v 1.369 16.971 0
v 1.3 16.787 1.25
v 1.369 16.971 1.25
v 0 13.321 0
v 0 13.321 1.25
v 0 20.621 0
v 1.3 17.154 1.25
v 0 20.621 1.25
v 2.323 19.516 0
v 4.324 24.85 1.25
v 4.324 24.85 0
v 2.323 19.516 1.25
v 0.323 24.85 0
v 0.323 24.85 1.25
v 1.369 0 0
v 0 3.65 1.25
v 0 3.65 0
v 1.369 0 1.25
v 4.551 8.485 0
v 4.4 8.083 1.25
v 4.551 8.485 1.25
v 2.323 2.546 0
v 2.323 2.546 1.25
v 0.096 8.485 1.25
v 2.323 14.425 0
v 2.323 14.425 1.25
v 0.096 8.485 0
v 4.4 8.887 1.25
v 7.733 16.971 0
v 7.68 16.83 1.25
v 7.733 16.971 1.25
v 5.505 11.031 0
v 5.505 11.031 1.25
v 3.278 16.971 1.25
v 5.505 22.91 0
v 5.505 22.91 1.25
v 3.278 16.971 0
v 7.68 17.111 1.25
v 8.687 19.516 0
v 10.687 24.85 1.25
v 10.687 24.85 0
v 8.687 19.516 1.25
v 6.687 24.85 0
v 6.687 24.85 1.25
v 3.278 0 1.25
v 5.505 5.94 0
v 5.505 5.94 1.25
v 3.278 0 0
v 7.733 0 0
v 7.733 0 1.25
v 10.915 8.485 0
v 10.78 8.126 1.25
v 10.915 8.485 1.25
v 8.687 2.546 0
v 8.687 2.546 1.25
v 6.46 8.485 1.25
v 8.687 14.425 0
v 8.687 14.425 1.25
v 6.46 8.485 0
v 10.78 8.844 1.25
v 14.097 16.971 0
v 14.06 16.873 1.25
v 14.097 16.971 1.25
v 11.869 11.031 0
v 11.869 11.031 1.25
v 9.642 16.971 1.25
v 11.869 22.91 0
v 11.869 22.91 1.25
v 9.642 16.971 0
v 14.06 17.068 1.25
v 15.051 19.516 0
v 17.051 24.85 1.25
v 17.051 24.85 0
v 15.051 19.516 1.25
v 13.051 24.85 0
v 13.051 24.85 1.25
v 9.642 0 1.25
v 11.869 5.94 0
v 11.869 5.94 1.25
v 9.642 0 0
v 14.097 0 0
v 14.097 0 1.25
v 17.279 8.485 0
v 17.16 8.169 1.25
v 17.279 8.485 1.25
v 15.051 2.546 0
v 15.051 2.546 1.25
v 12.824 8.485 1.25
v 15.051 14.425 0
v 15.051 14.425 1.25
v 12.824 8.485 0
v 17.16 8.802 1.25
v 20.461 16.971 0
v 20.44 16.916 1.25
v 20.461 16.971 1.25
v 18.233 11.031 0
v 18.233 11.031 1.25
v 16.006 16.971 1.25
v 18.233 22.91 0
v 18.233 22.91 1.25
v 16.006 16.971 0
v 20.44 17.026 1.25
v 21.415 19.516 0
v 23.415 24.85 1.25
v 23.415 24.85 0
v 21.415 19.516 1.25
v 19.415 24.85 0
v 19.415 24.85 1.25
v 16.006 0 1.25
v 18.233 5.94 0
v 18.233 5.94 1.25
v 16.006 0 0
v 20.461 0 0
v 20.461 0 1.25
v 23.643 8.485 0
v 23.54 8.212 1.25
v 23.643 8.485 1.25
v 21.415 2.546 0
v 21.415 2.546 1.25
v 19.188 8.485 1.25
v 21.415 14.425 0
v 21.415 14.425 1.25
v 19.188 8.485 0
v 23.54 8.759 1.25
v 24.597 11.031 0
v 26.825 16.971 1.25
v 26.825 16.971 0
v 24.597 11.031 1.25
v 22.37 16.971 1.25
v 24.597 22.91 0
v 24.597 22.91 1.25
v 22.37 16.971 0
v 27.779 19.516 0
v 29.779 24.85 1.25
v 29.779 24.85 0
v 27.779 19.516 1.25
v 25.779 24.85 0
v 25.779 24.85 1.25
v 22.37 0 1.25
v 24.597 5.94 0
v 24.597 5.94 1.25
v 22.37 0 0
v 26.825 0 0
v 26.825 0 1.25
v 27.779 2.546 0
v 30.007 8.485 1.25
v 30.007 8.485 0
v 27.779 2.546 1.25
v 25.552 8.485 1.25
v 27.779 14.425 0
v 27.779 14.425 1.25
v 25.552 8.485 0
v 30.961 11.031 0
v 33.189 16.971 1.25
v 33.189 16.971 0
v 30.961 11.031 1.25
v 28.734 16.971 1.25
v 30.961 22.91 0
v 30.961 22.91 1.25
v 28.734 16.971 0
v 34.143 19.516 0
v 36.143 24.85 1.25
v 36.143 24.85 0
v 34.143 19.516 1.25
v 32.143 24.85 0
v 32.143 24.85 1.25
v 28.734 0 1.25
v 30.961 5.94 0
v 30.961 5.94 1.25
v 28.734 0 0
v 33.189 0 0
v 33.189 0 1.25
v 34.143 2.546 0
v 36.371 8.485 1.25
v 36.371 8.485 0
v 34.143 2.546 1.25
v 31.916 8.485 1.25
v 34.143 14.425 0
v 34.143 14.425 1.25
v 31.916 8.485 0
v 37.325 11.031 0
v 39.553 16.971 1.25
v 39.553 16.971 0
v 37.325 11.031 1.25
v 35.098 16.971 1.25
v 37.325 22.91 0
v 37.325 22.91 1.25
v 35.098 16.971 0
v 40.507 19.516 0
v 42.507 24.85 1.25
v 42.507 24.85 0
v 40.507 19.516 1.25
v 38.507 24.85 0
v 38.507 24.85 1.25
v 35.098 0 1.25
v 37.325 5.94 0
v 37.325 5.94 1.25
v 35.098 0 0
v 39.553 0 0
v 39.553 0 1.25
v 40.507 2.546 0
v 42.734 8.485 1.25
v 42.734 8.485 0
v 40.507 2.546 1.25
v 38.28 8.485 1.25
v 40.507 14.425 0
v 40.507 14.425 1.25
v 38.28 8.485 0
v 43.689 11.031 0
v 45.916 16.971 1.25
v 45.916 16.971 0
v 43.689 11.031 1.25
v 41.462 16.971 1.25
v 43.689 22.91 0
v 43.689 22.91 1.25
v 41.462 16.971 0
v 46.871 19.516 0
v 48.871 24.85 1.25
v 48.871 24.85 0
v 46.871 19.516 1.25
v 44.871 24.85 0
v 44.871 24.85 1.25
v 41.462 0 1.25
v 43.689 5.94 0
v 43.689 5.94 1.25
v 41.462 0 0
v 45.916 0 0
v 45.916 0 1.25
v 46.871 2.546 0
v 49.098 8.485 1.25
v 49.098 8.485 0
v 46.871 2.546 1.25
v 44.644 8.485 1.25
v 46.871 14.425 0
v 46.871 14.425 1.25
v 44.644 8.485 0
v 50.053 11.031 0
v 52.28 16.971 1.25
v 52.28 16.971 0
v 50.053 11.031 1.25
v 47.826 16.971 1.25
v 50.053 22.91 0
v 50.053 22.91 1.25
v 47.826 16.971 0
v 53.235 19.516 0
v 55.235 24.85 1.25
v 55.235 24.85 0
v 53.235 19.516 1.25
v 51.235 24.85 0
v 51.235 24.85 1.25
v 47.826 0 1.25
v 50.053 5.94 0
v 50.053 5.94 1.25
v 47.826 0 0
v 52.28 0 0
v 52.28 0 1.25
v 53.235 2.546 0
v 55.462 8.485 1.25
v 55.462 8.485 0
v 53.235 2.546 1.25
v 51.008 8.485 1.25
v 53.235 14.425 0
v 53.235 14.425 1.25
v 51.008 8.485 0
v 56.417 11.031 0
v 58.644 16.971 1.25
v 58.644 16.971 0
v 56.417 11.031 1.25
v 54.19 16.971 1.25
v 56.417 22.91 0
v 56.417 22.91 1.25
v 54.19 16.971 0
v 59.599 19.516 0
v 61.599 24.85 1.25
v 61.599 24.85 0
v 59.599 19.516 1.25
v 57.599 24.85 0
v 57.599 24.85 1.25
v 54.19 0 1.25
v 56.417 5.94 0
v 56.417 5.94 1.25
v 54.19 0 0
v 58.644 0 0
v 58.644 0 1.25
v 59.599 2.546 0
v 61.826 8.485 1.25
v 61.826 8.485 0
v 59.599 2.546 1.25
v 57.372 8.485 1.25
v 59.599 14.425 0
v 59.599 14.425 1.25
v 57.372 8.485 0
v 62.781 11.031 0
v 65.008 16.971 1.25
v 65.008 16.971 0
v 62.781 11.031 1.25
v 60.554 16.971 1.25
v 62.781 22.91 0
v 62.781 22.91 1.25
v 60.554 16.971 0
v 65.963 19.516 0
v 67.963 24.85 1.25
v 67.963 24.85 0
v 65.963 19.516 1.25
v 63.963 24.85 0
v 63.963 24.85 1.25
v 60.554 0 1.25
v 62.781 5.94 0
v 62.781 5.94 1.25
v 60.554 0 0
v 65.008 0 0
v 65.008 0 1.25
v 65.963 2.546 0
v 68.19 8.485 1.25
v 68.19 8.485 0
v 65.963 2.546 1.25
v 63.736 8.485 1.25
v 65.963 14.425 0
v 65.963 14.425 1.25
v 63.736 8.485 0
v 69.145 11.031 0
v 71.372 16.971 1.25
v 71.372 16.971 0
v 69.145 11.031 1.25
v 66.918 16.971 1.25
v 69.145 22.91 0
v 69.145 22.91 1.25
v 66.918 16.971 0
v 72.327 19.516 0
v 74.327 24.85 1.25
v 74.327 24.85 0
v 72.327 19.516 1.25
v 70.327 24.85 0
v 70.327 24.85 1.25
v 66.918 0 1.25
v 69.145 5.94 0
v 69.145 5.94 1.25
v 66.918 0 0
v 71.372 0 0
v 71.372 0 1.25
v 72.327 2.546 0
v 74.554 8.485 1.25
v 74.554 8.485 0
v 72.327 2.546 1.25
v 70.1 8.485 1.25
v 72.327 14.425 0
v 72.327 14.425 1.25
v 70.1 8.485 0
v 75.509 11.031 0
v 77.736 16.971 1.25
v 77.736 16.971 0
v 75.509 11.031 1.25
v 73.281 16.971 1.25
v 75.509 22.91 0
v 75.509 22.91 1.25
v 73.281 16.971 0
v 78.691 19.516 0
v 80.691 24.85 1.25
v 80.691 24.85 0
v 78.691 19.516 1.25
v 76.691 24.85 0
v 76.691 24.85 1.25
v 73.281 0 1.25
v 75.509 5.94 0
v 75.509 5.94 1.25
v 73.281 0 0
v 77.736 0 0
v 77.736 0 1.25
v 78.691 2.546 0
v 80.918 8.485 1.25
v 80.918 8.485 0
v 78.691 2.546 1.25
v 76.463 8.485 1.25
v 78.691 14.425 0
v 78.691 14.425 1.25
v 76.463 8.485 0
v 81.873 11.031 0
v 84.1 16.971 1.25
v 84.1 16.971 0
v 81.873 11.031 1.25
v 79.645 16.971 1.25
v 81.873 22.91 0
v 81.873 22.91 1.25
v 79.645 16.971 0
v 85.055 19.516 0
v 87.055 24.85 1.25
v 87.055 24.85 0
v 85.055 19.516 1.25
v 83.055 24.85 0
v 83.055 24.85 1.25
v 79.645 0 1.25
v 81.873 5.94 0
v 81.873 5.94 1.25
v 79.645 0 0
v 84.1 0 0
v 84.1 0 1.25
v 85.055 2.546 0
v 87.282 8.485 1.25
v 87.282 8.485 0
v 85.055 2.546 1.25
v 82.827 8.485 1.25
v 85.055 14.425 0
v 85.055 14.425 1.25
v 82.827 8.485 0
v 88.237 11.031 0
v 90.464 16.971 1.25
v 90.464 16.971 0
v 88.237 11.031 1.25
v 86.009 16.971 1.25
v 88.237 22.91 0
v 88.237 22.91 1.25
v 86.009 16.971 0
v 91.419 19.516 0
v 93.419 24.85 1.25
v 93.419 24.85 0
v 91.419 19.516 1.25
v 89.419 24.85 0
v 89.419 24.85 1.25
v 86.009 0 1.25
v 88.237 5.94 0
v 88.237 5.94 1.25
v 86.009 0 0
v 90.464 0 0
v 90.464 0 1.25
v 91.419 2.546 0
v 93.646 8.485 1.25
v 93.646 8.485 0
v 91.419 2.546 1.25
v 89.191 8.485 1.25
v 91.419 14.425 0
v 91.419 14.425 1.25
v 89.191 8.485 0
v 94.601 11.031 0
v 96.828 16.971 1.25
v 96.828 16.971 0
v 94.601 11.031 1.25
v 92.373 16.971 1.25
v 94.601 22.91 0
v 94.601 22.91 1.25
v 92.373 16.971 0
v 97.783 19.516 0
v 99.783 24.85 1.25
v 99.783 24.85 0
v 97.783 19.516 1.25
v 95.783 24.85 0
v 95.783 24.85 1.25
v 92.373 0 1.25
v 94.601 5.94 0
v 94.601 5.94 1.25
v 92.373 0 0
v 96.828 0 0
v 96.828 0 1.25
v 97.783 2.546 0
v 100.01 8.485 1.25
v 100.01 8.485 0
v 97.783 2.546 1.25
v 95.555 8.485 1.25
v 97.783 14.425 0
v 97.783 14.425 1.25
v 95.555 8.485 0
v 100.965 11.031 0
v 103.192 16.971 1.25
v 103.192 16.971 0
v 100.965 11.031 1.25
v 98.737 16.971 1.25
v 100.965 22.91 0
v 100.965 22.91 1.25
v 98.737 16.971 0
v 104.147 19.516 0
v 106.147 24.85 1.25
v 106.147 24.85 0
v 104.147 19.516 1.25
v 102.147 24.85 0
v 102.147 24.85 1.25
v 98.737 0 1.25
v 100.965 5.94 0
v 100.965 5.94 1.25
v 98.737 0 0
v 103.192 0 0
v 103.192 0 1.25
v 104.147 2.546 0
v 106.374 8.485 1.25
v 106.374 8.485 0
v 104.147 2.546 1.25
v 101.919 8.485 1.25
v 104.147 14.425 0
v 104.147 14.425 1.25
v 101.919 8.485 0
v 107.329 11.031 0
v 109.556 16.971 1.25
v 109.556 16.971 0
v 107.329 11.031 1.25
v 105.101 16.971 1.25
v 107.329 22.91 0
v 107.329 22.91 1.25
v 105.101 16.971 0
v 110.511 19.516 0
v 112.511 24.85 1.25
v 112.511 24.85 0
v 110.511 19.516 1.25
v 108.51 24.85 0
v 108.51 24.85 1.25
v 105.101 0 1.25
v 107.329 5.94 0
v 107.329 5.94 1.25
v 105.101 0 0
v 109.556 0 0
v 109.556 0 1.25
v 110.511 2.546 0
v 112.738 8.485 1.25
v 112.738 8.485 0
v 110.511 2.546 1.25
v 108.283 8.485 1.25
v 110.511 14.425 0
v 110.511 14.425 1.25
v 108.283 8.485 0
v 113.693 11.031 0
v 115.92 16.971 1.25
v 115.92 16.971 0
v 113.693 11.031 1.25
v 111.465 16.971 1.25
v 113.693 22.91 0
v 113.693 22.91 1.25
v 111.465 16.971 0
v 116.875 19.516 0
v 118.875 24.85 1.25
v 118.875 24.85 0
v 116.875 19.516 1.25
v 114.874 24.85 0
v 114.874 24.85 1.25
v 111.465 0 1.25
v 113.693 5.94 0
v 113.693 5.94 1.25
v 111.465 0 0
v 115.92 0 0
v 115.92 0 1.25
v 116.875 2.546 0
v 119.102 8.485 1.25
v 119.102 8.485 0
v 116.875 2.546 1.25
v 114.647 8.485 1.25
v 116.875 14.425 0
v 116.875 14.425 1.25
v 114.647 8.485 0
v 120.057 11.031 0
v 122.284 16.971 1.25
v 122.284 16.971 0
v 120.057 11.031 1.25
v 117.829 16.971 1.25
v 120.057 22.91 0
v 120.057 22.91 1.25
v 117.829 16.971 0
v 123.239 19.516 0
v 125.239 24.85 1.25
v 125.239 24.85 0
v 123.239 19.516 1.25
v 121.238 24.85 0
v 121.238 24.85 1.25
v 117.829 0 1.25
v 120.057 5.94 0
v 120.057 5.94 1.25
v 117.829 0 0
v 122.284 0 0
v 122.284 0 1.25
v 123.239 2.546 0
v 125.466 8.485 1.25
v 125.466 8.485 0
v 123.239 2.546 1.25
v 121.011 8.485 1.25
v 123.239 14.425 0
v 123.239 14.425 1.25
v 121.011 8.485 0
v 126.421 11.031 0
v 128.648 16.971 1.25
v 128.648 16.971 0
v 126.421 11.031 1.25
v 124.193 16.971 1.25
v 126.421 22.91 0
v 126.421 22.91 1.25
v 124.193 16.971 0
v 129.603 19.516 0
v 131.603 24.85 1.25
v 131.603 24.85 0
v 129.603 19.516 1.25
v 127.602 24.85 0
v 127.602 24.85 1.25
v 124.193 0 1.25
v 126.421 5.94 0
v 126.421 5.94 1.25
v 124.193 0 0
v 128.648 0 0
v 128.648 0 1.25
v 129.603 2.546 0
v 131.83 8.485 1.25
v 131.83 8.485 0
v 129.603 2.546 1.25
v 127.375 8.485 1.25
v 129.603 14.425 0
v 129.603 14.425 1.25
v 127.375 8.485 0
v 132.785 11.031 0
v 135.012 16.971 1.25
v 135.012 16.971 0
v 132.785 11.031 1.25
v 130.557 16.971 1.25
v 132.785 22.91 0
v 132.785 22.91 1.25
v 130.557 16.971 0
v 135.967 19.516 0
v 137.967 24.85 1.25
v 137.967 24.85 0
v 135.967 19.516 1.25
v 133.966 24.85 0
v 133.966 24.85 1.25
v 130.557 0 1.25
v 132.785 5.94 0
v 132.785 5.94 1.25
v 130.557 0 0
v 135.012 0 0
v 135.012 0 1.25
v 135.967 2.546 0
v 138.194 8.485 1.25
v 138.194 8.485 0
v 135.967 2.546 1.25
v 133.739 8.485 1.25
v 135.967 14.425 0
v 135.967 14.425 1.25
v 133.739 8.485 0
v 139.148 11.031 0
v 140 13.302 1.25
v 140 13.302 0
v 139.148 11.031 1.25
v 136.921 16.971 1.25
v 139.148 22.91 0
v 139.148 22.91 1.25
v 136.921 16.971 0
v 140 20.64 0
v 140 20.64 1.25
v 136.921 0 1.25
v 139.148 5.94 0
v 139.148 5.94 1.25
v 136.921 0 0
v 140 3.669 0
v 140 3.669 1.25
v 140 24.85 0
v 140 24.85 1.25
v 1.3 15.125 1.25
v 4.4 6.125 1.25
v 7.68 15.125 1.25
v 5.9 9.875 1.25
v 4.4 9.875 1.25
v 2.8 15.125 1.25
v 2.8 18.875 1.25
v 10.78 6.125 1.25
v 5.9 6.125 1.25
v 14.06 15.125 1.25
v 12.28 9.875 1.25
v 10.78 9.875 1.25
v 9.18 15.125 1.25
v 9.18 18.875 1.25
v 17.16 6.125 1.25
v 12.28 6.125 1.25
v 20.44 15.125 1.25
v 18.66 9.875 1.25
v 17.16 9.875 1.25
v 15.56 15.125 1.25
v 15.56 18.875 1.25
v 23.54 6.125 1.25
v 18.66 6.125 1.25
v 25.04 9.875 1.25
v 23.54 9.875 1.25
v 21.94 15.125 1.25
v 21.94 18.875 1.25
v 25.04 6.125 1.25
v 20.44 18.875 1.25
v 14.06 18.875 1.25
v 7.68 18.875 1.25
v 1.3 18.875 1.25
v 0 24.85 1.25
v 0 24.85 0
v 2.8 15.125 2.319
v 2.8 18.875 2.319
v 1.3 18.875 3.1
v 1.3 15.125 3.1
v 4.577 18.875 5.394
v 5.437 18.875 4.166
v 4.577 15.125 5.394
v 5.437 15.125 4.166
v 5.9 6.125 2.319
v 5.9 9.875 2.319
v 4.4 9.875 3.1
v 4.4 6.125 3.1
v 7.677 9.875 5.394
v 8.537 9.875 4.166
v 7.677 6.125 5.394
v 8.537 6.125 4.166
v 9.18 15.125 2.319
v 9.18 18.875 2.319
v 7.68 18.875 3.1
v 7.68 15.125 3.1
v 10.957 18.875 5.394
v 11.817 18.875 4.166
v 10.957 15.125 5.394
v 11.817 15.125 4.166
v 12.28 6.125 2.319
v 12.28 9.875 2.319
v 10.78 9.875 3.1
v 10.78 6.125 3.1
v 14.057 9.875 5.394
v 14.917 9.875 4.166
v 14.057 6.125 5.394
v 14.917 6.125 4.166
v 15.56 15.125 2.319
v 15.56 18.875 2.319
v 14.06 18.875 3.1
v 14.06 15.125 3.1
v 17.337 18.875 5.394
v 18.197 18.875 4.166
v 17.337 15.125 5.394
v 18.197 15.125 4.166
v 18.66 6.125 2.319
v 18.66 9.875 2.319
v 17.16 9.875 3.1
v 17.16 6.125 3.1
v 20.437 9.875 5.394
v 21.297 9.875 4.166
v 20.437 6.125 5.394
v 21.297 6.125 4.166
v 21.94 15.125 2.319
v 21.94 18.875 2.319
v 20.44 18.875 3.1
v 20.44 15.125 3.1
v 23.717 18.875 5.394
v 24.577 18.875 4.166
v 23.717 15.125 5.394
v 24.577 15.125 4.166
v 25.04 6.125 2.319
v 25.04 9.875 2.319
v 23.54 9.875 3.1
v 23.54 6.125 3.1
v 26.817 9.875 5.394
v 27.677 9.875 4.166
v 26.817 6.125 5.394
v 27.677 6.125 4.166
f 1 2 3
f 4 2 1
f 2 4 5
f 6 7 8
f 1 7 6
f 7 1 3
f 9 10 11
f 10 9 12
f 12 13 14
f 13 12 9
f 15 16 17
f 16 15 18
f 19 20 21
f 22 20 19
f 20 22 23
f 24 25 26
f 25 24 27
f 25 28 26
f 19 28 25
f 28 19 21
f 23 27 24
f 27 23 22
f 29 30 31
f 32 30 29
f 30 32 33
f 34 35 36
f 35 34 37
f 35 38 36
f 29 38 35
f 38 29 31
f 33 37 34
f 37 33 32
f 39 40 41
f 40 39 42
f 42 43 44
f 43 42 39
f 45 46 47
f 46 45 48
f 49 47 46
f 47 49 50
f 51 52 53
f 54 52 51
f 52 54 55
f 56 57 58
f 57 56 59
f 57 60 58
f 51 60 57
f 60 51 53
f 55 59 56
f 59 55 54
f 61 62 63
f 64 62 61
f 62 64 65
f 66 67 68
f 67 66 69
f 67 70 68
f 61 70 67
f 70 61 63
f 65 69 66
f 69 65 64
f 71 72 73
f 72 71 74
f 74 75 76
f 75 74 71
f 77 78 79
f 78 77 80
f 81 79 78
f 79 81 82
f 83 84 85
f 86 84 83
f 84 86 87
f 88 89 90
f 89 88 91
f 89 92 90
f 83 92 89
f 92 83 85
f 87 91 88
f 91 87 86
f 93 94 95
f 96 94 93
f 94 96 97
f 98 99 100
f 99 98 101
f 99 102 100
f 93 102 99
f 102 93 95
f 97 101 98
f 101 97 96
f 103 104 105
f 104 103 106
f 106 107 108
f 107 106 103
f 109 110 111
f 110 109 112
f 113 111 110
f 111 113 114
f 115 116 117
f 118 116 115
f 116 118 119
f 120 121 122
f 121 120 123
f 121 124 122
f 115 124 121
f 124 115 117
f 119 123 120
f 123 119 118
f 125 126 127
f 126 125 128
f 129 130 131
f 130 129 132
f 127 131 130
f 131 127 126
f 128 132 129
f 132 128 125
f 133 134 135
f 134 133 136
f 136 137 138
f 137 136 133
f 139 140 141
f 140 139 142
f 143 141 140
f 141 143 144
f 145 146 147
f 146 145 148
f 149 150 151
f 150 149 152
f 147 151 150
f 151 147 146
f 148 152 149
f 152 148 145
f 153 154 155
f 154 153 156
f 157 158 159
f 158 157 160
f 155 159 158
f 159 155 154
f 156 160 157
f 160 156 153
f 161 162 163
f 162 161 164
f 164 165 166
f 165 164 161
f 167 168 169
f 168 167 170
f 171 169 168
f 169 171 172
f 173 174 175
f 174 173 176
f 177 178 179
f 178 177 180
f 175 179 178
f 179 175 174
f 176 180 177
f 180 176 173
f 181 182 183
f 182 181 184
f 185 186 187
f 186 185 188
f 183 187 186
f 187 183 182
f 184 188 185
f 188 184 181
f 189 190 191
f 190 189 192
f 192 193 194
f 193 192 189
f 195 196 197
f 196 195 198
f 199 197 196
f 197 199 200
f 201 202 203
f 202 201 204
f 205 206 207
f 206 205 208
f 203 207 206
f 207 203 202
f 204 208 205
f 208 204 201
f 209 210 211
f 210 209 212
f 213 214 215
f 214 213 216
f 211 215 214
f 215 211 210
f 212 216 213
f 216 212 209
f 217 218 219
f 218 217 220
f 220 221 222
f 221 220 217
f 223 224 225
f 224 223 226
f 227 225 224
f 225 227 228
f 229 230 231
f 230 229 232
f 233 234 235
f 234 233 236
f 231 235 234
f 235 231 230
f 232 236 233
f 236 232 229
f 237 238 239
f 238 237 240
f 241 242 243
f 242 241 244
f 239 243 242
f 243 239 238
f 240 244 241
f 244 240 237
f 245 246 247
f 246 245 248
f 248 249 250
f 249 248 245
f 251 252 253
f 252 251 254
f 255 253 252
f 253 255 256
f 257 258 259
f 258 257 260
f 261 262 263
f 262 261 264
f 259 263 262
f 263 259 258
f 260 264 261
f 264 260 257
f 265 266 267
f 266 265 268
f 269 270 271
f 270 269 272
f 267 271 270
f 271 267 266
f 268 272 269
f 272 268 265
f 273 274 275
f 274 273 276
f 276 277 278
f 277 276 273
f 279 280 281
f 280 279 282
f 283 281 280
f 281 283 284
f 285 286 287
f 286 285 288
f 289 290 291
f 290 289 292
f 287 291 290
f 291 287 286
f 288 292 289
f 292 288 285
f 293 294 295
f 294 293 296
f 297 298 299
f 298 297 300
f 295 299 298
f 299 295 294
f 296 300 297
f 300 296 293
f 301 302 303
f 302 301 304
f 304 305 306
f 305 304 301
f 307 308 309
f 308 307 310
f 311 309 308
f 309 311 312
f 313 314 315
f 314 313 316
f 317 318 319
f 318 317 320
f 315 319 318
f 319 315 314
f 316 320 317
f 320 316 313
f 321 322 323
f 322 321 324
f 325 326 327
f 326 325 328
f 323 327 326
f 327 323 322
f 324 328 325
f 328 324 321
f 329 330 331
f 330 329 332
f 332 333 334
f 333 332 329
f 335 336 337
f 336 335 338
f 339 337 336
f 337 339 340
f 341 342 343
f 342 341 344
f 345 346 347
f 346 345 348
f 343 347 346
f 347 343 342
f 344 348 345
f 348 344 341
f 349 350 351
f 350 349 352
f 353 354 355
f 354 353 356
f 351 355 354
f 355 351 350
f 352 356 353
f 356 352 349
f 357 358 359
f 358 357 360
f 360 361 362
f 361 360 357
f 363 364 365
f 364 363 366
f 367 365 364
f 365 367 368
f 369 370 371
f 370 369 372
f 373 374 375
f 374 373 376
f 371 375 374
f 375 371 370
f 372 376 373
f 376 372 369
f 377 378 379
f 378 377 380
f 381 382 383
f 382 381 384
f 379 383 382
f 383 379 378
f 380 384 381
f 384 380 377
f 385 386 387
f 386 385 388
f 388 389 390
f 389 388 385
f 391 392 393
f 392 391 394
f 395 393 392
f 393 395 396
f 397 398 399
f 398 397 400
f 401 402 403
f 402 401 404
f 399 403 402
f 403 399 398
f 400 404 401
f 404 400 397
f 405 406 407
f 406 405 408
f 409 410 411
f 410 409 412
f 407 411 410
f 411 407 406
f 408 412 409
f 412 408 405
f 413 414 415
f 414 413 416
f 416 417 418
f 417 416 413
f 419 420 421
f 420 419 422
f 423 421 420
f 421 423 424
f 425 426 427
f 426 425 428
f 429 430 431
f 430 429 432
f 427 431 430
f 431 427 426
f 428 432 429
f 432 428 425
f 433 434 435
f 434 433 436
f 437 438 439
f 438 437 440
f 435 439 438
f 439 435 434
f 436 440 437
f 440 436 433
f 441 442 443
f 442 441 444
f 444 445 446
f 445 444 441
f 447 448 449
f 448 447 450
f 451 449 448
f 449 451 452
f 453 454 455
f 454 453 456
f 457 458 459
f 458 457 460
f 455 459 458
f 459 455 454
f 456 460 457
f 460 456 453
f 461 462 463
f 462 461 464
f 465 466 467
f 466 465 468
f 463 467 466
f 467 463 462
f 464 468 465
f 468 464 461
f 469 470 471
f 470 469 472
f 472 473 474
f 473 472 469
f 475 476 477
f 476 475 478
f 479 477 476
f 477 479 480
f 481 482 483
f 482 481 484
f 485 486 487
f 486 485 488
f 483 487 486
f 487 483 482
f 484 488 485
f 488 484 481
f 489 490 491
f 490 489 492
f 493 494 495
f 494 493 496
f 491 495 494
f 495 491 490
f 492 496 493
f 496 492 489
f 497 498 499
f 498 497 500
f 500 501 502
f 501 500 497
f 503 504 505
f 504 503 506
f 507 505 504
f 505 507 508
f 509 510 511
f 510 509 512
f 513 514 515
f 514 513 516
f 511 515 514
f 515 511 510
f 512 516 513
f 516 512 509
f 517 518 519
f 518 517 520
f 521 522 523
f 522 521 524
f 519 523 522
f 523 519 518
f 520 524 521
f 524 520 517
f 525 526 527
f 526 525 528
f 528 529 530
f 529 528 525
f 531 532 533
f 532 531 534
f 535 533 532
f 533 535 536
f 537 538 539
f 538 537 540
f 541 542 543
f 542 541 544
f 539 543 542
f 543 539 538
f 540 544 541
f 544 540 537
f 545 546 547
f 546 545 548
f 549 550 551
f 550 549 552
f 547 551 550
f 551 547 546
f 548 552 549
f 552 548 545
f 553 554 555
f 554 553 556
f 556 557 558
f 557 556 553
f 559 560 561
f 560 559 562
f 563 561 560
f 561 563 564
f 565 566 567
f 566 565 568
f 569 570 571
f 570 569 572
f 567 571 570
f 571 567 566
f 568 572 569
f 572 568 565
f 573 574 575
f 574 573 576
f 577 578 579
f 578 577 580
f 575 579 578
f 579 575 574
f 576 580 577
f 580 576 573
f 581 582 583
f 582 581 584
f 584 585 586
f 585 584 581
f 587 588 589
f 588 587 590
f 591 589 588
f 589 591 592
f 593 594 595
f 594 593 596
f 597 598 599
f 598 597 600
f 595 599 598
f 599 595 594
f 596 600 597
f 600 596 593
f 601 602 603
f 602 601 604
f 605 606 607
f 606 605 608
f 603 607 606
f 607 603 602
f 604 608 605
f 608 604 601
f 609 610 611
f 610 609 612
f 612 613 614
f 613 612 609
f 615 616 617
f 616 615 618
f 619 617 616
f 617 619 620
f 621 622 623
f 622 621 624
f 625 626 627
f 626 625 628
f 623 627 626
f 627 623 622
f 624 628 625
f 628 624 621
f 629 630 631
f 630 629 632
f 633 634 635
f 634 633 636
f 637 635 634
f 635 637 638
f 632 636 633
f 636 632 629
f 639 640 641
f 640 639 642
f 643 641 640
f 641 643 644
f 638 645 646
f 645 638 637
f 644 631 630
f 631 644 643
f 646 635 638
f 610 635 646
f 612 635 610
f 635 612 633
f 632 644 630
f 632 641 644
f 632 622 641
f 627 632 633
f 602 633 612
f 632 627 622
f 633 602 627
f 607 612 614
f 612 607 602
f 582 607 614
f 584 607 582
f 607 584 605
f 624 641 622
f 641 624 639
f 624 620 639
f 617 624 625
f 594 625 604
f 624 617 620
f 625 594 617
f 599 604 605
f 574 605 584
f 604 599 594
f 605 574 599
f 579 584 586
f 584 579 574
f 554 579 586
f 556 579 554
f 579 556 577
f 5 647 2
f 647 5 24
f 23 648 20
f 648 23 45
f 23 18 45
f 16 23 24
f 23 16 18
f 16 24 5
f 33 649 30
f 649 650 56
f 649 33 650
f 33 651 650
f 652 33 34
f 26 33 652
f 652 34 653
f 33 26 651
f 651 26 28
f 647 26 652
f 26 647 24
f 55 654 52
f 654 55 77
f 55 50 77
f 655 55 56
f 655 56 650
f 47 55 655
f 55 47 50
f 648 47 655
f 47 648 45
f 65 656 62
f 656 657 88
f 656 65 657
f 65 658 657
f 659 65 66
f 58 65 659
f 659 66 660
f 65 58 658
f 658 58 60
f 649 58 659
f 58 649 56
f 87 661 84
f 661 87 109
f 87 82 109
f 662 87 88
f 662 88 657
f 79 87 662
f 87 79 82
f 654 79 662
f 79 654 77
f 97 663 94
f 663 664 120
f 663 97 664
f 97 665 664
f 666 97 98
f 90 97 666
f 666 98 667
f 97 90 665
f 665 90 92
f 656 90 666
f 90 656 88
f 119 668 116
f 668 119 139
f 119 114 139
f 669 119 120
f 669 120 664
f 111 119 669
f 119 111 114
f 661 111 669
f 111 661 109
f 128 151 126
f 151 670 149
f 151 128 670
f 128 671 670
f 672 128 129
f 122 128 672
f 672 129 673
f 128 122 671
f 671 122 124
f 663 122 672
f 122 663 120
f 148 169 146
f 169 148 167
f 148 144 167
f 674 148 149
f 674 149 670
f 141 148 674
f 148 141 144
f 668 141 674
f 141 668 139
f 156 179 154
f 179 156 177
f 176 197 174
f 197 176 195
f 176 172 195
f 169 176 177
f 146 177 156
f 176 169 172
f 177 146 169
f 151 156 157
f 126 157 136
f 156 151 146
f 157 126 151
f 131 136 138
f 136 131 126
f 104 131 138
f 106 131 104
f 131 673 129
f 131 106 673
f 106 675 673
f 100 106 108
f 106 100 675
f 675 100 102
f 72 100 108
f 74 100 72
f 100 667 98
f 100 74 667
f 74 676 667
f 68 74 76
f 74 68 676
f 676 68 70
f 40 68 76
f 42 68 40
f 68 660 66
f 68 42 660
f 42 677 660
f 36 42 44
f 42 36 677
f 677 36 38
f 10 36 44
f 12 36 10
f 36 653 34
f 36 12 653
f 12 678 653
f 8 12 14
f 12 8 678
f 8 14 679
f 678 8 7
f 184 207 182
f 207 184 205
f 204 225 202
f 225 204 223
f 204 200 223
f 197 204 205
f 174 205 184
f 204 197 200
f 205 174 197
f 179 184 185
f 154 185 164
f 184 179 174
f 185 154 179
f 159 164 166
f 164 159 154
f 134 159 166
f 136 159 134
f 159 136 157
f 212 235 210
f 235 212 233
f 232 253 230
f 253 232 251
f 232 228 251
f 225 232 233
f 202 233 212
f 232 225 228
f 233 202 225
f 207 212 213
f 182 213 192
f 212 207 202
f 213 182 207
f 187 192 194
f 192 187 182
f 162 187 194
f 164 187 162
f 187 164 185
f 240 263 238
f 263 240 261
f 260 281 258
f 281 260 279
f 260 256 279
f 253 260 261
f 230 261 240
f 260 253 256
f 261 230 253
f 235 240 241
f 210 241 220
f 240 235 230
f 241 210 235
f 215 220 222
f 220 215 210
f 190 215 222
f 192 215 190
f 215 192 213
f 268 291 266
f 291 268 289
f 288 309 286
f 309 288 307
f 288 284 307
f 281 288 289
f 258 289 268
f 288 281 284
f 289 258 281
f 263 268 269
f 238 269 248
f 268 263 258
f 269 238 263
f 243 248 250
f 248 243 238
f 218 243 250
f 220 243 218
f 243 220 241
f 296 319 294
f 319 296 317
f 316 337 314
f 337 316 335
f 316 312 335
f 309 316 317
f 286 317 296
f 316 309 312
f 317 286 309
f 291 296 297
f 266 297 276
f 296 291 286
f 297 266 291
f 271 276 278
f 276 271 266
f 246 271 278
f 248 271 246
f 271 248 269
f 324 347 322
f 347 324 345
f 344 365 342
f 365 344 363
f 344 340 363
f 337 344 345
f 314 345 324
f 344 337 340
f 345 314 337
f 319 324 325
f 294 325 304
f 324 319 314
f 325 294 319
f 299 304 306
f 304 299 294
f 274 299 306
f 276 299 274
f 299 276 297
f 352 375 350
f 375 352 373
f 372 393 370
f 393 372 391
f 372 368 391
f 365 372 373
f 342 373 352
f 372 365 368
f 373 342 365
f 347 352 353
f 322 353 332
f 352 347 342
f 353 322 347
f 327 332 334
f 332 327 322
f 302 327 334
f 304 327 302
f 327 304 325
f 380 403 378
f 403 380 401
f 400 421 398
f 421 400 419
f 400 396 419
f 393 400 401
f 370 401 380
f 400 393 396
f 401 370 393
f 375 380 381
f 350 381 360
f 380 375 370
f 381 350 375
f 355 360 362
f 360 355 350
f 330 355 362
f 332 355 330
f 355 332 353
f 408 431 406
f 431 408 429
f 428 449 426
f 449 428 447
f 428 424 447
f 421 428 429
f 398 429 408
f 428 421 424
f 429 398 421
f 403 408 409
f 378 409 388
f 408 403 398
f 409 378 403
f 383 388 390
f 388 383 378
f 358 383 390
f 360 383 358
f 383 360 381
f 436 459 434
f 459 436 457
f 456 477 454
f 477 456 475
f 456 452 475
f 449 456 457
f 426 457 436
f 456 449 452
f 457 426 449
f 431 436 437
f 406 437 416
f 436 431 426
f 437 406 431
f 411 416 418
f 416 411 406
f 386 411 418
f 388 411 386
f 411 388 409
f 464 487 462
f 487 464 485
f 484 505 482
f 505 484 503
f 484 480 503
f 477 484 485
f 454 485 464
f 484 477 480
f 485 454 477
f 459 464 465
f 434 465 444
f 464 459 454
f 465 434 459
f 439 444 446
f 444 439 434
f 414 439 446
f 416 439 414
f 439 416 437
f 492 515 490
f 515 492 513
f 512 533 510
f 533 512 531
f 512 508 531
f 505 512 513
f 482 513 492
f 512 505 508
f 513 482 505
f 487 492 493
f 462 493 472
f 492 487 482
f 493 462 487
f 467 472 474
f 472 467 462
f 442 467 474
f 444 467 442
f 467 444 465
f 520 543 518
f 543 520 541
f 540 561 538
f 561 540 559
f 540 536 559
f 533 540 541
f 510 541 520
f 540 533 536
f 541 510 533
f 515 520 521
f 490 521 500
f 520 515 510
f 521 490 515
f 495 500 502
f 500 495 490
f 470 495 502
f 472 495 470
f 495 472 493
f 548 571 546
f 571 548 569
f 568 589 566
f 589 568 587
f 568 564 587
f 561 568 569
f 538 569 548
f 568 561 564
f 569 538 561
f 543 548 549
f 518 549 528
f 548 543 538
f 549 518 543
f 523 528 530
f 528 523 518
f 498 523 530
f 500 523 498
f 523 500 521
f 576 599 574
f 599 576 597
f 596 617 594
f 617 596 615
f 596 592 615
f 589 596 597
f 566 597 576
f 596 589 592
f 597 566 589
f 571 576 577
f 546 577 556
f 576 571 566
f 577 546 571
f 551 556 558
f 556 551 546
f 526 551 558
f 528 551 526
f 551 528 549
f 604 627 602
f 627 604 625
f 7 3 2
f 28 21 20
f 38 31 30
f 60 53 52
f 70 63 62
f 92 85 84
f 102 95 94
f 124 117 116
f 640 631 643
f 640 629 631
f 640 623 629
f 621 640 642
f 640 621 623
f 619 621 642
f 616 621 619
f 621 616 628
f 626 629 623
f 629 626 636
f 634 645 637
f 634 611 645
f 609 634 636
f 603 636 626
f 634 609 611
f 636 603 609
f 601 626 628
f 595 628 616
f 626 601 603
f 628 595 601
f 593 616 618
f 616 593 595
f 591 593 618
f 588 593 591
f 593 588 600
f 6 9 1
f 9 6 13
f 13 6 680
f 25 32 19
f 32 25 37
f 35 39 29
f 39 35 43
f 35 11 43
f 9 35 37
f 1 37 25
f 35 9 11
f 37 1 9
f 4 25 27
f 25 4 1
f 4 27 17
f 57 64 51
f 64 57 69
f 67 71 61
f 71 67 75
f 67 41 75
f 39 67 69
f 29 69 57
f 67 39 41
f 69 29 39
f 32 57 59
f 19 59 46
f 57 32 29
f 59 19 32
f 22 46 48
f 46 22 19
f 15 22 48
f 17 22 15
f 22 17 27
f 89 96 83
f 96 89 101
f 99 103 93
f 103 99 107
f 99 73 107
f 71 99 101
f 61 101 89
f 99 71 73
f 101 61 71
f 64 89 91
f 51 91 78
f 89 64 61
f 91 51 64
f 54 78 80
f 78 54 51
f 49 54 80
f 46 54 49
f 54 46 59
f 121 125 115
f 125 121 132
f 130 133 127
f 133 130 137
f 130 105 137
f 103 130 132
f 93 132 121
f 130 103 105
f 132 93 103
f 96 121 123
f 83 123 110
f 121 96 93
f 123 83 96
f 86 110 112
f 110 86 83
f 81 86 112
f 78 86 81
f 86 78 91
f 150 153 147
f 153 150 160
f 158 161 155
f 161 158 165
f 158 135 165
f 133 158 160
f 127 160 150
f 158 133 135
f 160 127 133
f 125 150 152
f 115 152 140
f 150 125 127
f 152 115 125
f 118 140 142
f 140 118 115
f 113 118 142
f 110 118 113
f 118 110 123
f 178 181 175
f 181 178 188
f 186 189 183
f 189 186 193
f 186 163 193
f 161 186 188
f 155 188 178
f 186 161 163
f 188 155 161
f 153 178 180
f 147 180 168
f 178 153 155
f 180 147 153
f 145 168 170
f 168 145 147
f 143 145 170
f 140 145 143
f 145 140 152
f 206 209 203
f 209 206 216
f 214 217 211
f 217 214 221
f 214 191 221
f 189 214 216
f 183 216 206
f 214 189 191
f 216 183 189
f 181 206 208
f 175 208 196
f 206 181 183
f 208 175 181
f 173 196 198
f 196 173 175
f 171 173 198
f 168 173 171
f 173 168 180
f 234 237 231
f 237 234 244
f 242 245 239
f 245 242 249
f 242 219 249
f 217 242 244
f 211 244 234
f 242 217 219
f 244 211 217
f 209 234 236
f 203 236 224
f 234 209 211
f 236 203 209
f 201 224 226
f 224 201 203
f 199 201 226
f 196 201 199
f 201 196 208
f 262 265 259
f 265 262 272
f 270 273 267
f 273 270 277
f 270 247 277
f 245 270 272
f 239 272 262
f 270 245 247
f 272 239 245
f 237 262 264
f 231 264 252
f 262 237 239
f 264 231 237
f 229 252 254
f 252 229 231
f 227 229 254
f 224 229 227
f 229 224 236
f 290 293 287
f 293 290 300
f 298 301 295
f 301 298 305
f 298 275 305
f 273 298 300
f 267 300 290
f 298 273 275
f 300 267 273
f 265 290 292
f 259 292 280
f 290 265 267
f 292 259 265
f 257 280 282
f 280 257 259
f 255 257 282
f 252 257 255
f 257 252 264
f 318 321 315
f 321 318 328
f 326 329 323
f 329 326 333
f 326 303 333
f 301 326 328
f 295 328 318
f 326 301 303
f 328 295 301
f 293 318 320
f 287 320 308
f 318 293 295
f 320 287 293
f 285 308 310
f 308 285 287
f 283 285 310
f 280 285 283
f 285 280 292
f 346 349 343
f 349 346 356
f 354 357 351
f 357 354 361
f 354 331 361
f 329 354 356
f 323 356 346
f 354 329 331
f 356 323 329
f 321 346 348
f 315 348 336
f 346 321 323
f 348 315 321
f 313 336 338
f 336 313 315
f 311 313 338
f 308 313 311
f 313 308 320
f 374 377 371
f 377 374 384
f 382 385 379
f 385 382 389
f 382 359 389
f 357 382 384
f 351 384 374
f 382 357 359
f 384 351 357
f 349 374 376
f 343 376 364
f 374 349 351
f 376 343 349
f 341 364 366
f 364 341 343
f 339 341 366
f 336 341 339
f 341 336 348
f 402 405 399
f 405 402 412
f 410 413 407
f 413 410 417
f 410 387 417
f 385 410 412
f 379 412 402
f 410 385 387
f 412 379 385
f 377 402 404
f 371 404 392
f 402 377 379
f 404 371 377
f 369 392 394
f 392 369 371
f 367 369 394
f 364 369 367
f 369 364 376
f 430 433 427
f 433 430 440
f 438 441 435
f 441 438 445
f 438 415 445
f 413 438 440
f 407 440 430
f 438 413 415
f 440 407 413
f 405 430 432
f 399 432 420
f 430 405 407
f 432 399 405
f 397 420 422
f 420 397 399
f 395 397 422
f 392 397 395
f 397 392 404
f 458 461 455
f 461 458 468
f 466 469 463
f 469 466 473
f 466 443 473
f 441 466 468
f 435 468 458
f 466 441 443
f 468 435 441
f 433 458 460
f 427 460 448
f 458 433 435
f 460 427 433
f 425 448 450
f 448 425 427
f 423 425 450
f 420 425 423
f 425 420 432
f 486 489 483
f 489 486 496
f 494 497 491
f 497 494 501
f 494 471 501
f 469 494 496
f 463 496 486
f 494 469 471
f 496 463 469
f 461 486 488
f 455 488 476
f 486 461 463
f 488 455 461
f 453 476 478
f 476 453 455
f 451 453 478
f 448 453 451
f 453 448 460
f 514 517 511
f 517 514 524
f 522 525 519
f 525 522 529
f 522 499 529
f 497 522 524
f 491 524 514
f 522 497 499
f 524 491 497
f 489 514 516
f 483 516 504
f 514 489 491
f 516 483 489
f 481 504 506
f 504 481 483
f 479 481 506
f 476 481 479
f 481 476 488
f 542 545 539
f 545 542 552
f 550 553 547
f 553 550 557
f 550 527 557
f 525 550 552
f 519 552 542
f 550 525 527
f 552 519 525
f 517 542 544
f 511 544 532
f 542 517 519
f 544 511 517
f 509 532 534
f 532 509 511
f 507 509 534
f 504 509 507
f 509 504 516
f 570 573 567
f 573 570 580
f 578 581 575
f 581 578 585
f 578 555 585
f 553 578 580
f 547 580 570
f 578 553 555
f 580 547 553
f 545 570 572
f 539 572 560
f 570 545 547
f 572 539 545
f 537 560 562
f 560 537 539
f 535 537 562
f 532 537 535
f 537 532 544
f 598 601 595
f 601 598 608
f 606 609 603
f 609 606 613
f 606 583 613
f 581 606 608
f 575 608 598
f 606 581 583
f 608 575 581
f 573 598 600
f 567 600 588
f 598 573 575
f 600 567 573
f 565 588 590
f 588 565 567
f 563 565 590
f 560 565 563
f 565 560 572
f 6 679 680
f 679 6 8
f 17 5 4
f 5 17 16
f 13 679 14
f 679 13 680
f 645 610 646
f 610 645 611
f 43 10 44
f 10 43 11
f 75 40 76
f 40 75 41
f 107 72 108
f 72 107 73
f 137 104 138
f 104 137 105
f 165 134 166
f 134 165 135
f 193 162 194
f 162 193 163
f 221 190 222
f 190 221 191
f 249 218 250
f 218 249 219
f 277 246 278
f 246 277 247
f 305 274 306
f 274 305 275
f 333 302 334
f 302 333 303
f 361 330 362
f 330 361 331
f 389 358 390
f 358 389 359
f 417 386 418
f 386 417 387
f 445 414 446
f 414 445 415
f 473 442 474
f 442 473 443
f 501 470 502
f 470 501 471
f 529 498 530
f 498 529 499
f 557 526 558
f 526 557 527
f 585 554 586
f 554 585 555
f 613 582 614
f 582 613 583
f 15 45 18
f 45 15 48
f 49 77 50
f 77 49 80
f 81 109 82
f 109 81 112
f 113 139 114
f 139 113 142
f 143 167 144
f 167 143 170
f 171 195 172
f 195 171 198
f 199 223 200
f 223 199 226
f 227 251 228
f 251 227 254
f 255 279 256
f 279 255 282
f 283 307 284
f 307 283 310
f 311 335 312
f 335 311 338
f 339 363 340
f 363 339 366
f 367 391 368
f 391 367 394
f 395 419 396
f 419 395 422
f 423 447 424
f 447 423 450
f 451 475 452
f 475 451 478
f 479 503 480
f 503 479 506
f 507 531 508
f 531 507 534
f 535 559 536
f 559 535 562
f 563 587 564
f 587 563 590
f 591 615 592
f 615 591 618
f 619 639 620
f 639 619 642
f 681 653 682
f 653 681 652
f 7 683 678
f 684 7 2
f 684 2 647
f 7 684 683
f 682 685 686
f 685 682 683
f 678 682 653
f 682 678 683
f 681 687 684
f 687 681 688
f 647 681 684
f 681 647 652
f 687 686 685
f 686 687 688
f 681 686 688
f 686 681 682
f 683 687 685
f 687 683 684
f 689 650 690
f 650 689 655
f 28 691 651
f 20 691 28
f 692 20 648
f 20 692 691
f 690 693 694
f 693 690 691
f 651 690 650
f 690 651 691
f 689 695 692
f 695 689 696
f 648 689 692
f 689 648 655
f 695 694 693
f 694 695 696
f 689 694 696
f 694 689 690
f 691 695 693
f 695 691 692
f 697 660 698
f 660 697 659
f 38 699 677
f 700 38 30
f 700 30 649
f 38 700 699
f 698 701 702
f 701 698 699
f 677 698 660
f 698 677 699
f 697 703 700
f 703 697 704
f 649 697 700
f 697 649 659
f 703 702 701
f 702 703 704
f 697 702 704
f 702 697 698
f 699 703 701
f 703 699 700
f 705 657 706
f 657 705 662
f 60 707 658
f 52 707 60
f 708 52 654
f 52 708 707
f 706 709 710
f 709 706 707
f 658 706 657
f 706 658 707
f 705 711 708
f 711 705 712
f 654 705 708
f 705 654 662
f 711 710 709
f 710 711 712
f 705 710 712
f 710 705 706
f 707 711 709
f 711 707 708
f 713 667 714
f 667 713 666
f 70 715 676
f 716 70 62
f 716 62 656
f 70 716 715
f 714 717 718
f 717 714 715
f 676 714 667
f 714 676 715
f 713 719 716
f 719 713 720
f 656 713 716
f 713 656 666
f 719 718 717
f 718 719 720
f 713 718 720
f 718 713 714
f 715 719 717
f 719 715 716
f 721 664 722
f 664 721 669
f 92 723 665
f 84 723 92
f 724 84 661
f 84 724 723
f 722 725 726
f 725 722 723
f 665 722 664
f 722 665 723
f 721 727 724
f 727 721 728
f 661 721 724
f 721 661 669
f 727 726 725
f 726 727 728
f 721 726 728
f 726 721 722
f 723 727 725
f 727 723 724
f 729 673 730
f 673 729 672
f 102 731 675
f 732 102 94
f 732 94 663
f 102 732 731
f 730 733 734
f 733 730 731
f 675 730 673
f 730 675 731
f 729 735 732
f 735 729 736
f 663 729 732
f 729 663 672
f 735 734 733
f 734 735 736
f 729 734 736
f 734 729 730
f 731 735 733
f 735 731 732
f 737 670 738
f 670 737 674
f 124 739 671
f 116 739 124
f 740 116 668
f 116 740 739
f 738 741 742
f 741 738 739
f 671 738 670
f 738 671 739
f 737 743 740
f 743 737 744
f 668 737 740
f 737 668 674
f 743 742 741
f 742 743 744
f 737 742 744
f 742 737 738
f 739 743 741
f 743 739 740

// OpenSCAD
//print 2 shells / 100% infill

/* [Strap Settings] */

//(in mm)
strap_length = 140; 

//(25mm 1st row, 15mm each extra)
width_in_rows = 1; 

//(hooks)
nib_rows = 4;  

//(in mm)
strap_thickness = 1.25; 

/* [Advanced] */

//(nibs every X position)
nib_spacing_multiplier = 1;

nib_angle = 55;
nib_top_length = 4;
nib_thickness = 1.5;
nib_width = 3.75;

//(based on strap thickness)
extra_nib_base_height = .6;

/* [Hidden] */
nib_spacing = 6.38;
length_per_quad = 5.0;
strap_width_per_row = 24.85;


for ( y = [1 : width_in_rows] )
{
	translate([0,(strap_width_per_row / 1.5) * (y - 1),0]) one_row();
}


module one_row()
{
	difference()
	{
		cube([strap_length,strap_width_per_row,strap_thickness]);
		cut_outs();
	}
	nibs();

}

module cut_outs()
{
	scale ([0.9,2.4,1])
	for ( x = [0 : (strap_length / length_per_quad) + 1 ])
	{
		translate([-10.5,0,0])
		rotate( -45, [0, 0, 1])
		for ( y = [0 : (strap_length / length_per_quad) + 1] )
		{
			 if (x - y > -4)
			 if (x - y < 2)	
			{
		    	translate([x * 5, y * 5, strap_thickness * -.1])
			 	cube([3.5,3.5,strap_thickness * 1.2]);}
				}
	}
}

module nibs()
{
	for ( x = [0 : nib_rows - 1])
	{
	translate ([1.3 + x * nib_spacing * nib_spacing_multiplier, 18.5 - (nib_width / 2),0]) nib();
	translate ([4.4 + x * nib_spacing * nib_spacing_multiplier, 9.5 - (nib_width / 2),0]) nib();
	}

}

module nib()
{

	translate ([0,nib_thickness / -1,strap_thickness]) rotate (0,[0,1,0]) cube([nib_thickness,nib_width,strap_thickness + extra_nib_base_height]);
	translate ([0,nib_thickness / -1,strap_thickness + (strap_thickness + extra_nib_base_height)]) rotate (nib_angle,[0,1,0]) cube([nib_thickness,nib_width,nib_top_length]);
}
